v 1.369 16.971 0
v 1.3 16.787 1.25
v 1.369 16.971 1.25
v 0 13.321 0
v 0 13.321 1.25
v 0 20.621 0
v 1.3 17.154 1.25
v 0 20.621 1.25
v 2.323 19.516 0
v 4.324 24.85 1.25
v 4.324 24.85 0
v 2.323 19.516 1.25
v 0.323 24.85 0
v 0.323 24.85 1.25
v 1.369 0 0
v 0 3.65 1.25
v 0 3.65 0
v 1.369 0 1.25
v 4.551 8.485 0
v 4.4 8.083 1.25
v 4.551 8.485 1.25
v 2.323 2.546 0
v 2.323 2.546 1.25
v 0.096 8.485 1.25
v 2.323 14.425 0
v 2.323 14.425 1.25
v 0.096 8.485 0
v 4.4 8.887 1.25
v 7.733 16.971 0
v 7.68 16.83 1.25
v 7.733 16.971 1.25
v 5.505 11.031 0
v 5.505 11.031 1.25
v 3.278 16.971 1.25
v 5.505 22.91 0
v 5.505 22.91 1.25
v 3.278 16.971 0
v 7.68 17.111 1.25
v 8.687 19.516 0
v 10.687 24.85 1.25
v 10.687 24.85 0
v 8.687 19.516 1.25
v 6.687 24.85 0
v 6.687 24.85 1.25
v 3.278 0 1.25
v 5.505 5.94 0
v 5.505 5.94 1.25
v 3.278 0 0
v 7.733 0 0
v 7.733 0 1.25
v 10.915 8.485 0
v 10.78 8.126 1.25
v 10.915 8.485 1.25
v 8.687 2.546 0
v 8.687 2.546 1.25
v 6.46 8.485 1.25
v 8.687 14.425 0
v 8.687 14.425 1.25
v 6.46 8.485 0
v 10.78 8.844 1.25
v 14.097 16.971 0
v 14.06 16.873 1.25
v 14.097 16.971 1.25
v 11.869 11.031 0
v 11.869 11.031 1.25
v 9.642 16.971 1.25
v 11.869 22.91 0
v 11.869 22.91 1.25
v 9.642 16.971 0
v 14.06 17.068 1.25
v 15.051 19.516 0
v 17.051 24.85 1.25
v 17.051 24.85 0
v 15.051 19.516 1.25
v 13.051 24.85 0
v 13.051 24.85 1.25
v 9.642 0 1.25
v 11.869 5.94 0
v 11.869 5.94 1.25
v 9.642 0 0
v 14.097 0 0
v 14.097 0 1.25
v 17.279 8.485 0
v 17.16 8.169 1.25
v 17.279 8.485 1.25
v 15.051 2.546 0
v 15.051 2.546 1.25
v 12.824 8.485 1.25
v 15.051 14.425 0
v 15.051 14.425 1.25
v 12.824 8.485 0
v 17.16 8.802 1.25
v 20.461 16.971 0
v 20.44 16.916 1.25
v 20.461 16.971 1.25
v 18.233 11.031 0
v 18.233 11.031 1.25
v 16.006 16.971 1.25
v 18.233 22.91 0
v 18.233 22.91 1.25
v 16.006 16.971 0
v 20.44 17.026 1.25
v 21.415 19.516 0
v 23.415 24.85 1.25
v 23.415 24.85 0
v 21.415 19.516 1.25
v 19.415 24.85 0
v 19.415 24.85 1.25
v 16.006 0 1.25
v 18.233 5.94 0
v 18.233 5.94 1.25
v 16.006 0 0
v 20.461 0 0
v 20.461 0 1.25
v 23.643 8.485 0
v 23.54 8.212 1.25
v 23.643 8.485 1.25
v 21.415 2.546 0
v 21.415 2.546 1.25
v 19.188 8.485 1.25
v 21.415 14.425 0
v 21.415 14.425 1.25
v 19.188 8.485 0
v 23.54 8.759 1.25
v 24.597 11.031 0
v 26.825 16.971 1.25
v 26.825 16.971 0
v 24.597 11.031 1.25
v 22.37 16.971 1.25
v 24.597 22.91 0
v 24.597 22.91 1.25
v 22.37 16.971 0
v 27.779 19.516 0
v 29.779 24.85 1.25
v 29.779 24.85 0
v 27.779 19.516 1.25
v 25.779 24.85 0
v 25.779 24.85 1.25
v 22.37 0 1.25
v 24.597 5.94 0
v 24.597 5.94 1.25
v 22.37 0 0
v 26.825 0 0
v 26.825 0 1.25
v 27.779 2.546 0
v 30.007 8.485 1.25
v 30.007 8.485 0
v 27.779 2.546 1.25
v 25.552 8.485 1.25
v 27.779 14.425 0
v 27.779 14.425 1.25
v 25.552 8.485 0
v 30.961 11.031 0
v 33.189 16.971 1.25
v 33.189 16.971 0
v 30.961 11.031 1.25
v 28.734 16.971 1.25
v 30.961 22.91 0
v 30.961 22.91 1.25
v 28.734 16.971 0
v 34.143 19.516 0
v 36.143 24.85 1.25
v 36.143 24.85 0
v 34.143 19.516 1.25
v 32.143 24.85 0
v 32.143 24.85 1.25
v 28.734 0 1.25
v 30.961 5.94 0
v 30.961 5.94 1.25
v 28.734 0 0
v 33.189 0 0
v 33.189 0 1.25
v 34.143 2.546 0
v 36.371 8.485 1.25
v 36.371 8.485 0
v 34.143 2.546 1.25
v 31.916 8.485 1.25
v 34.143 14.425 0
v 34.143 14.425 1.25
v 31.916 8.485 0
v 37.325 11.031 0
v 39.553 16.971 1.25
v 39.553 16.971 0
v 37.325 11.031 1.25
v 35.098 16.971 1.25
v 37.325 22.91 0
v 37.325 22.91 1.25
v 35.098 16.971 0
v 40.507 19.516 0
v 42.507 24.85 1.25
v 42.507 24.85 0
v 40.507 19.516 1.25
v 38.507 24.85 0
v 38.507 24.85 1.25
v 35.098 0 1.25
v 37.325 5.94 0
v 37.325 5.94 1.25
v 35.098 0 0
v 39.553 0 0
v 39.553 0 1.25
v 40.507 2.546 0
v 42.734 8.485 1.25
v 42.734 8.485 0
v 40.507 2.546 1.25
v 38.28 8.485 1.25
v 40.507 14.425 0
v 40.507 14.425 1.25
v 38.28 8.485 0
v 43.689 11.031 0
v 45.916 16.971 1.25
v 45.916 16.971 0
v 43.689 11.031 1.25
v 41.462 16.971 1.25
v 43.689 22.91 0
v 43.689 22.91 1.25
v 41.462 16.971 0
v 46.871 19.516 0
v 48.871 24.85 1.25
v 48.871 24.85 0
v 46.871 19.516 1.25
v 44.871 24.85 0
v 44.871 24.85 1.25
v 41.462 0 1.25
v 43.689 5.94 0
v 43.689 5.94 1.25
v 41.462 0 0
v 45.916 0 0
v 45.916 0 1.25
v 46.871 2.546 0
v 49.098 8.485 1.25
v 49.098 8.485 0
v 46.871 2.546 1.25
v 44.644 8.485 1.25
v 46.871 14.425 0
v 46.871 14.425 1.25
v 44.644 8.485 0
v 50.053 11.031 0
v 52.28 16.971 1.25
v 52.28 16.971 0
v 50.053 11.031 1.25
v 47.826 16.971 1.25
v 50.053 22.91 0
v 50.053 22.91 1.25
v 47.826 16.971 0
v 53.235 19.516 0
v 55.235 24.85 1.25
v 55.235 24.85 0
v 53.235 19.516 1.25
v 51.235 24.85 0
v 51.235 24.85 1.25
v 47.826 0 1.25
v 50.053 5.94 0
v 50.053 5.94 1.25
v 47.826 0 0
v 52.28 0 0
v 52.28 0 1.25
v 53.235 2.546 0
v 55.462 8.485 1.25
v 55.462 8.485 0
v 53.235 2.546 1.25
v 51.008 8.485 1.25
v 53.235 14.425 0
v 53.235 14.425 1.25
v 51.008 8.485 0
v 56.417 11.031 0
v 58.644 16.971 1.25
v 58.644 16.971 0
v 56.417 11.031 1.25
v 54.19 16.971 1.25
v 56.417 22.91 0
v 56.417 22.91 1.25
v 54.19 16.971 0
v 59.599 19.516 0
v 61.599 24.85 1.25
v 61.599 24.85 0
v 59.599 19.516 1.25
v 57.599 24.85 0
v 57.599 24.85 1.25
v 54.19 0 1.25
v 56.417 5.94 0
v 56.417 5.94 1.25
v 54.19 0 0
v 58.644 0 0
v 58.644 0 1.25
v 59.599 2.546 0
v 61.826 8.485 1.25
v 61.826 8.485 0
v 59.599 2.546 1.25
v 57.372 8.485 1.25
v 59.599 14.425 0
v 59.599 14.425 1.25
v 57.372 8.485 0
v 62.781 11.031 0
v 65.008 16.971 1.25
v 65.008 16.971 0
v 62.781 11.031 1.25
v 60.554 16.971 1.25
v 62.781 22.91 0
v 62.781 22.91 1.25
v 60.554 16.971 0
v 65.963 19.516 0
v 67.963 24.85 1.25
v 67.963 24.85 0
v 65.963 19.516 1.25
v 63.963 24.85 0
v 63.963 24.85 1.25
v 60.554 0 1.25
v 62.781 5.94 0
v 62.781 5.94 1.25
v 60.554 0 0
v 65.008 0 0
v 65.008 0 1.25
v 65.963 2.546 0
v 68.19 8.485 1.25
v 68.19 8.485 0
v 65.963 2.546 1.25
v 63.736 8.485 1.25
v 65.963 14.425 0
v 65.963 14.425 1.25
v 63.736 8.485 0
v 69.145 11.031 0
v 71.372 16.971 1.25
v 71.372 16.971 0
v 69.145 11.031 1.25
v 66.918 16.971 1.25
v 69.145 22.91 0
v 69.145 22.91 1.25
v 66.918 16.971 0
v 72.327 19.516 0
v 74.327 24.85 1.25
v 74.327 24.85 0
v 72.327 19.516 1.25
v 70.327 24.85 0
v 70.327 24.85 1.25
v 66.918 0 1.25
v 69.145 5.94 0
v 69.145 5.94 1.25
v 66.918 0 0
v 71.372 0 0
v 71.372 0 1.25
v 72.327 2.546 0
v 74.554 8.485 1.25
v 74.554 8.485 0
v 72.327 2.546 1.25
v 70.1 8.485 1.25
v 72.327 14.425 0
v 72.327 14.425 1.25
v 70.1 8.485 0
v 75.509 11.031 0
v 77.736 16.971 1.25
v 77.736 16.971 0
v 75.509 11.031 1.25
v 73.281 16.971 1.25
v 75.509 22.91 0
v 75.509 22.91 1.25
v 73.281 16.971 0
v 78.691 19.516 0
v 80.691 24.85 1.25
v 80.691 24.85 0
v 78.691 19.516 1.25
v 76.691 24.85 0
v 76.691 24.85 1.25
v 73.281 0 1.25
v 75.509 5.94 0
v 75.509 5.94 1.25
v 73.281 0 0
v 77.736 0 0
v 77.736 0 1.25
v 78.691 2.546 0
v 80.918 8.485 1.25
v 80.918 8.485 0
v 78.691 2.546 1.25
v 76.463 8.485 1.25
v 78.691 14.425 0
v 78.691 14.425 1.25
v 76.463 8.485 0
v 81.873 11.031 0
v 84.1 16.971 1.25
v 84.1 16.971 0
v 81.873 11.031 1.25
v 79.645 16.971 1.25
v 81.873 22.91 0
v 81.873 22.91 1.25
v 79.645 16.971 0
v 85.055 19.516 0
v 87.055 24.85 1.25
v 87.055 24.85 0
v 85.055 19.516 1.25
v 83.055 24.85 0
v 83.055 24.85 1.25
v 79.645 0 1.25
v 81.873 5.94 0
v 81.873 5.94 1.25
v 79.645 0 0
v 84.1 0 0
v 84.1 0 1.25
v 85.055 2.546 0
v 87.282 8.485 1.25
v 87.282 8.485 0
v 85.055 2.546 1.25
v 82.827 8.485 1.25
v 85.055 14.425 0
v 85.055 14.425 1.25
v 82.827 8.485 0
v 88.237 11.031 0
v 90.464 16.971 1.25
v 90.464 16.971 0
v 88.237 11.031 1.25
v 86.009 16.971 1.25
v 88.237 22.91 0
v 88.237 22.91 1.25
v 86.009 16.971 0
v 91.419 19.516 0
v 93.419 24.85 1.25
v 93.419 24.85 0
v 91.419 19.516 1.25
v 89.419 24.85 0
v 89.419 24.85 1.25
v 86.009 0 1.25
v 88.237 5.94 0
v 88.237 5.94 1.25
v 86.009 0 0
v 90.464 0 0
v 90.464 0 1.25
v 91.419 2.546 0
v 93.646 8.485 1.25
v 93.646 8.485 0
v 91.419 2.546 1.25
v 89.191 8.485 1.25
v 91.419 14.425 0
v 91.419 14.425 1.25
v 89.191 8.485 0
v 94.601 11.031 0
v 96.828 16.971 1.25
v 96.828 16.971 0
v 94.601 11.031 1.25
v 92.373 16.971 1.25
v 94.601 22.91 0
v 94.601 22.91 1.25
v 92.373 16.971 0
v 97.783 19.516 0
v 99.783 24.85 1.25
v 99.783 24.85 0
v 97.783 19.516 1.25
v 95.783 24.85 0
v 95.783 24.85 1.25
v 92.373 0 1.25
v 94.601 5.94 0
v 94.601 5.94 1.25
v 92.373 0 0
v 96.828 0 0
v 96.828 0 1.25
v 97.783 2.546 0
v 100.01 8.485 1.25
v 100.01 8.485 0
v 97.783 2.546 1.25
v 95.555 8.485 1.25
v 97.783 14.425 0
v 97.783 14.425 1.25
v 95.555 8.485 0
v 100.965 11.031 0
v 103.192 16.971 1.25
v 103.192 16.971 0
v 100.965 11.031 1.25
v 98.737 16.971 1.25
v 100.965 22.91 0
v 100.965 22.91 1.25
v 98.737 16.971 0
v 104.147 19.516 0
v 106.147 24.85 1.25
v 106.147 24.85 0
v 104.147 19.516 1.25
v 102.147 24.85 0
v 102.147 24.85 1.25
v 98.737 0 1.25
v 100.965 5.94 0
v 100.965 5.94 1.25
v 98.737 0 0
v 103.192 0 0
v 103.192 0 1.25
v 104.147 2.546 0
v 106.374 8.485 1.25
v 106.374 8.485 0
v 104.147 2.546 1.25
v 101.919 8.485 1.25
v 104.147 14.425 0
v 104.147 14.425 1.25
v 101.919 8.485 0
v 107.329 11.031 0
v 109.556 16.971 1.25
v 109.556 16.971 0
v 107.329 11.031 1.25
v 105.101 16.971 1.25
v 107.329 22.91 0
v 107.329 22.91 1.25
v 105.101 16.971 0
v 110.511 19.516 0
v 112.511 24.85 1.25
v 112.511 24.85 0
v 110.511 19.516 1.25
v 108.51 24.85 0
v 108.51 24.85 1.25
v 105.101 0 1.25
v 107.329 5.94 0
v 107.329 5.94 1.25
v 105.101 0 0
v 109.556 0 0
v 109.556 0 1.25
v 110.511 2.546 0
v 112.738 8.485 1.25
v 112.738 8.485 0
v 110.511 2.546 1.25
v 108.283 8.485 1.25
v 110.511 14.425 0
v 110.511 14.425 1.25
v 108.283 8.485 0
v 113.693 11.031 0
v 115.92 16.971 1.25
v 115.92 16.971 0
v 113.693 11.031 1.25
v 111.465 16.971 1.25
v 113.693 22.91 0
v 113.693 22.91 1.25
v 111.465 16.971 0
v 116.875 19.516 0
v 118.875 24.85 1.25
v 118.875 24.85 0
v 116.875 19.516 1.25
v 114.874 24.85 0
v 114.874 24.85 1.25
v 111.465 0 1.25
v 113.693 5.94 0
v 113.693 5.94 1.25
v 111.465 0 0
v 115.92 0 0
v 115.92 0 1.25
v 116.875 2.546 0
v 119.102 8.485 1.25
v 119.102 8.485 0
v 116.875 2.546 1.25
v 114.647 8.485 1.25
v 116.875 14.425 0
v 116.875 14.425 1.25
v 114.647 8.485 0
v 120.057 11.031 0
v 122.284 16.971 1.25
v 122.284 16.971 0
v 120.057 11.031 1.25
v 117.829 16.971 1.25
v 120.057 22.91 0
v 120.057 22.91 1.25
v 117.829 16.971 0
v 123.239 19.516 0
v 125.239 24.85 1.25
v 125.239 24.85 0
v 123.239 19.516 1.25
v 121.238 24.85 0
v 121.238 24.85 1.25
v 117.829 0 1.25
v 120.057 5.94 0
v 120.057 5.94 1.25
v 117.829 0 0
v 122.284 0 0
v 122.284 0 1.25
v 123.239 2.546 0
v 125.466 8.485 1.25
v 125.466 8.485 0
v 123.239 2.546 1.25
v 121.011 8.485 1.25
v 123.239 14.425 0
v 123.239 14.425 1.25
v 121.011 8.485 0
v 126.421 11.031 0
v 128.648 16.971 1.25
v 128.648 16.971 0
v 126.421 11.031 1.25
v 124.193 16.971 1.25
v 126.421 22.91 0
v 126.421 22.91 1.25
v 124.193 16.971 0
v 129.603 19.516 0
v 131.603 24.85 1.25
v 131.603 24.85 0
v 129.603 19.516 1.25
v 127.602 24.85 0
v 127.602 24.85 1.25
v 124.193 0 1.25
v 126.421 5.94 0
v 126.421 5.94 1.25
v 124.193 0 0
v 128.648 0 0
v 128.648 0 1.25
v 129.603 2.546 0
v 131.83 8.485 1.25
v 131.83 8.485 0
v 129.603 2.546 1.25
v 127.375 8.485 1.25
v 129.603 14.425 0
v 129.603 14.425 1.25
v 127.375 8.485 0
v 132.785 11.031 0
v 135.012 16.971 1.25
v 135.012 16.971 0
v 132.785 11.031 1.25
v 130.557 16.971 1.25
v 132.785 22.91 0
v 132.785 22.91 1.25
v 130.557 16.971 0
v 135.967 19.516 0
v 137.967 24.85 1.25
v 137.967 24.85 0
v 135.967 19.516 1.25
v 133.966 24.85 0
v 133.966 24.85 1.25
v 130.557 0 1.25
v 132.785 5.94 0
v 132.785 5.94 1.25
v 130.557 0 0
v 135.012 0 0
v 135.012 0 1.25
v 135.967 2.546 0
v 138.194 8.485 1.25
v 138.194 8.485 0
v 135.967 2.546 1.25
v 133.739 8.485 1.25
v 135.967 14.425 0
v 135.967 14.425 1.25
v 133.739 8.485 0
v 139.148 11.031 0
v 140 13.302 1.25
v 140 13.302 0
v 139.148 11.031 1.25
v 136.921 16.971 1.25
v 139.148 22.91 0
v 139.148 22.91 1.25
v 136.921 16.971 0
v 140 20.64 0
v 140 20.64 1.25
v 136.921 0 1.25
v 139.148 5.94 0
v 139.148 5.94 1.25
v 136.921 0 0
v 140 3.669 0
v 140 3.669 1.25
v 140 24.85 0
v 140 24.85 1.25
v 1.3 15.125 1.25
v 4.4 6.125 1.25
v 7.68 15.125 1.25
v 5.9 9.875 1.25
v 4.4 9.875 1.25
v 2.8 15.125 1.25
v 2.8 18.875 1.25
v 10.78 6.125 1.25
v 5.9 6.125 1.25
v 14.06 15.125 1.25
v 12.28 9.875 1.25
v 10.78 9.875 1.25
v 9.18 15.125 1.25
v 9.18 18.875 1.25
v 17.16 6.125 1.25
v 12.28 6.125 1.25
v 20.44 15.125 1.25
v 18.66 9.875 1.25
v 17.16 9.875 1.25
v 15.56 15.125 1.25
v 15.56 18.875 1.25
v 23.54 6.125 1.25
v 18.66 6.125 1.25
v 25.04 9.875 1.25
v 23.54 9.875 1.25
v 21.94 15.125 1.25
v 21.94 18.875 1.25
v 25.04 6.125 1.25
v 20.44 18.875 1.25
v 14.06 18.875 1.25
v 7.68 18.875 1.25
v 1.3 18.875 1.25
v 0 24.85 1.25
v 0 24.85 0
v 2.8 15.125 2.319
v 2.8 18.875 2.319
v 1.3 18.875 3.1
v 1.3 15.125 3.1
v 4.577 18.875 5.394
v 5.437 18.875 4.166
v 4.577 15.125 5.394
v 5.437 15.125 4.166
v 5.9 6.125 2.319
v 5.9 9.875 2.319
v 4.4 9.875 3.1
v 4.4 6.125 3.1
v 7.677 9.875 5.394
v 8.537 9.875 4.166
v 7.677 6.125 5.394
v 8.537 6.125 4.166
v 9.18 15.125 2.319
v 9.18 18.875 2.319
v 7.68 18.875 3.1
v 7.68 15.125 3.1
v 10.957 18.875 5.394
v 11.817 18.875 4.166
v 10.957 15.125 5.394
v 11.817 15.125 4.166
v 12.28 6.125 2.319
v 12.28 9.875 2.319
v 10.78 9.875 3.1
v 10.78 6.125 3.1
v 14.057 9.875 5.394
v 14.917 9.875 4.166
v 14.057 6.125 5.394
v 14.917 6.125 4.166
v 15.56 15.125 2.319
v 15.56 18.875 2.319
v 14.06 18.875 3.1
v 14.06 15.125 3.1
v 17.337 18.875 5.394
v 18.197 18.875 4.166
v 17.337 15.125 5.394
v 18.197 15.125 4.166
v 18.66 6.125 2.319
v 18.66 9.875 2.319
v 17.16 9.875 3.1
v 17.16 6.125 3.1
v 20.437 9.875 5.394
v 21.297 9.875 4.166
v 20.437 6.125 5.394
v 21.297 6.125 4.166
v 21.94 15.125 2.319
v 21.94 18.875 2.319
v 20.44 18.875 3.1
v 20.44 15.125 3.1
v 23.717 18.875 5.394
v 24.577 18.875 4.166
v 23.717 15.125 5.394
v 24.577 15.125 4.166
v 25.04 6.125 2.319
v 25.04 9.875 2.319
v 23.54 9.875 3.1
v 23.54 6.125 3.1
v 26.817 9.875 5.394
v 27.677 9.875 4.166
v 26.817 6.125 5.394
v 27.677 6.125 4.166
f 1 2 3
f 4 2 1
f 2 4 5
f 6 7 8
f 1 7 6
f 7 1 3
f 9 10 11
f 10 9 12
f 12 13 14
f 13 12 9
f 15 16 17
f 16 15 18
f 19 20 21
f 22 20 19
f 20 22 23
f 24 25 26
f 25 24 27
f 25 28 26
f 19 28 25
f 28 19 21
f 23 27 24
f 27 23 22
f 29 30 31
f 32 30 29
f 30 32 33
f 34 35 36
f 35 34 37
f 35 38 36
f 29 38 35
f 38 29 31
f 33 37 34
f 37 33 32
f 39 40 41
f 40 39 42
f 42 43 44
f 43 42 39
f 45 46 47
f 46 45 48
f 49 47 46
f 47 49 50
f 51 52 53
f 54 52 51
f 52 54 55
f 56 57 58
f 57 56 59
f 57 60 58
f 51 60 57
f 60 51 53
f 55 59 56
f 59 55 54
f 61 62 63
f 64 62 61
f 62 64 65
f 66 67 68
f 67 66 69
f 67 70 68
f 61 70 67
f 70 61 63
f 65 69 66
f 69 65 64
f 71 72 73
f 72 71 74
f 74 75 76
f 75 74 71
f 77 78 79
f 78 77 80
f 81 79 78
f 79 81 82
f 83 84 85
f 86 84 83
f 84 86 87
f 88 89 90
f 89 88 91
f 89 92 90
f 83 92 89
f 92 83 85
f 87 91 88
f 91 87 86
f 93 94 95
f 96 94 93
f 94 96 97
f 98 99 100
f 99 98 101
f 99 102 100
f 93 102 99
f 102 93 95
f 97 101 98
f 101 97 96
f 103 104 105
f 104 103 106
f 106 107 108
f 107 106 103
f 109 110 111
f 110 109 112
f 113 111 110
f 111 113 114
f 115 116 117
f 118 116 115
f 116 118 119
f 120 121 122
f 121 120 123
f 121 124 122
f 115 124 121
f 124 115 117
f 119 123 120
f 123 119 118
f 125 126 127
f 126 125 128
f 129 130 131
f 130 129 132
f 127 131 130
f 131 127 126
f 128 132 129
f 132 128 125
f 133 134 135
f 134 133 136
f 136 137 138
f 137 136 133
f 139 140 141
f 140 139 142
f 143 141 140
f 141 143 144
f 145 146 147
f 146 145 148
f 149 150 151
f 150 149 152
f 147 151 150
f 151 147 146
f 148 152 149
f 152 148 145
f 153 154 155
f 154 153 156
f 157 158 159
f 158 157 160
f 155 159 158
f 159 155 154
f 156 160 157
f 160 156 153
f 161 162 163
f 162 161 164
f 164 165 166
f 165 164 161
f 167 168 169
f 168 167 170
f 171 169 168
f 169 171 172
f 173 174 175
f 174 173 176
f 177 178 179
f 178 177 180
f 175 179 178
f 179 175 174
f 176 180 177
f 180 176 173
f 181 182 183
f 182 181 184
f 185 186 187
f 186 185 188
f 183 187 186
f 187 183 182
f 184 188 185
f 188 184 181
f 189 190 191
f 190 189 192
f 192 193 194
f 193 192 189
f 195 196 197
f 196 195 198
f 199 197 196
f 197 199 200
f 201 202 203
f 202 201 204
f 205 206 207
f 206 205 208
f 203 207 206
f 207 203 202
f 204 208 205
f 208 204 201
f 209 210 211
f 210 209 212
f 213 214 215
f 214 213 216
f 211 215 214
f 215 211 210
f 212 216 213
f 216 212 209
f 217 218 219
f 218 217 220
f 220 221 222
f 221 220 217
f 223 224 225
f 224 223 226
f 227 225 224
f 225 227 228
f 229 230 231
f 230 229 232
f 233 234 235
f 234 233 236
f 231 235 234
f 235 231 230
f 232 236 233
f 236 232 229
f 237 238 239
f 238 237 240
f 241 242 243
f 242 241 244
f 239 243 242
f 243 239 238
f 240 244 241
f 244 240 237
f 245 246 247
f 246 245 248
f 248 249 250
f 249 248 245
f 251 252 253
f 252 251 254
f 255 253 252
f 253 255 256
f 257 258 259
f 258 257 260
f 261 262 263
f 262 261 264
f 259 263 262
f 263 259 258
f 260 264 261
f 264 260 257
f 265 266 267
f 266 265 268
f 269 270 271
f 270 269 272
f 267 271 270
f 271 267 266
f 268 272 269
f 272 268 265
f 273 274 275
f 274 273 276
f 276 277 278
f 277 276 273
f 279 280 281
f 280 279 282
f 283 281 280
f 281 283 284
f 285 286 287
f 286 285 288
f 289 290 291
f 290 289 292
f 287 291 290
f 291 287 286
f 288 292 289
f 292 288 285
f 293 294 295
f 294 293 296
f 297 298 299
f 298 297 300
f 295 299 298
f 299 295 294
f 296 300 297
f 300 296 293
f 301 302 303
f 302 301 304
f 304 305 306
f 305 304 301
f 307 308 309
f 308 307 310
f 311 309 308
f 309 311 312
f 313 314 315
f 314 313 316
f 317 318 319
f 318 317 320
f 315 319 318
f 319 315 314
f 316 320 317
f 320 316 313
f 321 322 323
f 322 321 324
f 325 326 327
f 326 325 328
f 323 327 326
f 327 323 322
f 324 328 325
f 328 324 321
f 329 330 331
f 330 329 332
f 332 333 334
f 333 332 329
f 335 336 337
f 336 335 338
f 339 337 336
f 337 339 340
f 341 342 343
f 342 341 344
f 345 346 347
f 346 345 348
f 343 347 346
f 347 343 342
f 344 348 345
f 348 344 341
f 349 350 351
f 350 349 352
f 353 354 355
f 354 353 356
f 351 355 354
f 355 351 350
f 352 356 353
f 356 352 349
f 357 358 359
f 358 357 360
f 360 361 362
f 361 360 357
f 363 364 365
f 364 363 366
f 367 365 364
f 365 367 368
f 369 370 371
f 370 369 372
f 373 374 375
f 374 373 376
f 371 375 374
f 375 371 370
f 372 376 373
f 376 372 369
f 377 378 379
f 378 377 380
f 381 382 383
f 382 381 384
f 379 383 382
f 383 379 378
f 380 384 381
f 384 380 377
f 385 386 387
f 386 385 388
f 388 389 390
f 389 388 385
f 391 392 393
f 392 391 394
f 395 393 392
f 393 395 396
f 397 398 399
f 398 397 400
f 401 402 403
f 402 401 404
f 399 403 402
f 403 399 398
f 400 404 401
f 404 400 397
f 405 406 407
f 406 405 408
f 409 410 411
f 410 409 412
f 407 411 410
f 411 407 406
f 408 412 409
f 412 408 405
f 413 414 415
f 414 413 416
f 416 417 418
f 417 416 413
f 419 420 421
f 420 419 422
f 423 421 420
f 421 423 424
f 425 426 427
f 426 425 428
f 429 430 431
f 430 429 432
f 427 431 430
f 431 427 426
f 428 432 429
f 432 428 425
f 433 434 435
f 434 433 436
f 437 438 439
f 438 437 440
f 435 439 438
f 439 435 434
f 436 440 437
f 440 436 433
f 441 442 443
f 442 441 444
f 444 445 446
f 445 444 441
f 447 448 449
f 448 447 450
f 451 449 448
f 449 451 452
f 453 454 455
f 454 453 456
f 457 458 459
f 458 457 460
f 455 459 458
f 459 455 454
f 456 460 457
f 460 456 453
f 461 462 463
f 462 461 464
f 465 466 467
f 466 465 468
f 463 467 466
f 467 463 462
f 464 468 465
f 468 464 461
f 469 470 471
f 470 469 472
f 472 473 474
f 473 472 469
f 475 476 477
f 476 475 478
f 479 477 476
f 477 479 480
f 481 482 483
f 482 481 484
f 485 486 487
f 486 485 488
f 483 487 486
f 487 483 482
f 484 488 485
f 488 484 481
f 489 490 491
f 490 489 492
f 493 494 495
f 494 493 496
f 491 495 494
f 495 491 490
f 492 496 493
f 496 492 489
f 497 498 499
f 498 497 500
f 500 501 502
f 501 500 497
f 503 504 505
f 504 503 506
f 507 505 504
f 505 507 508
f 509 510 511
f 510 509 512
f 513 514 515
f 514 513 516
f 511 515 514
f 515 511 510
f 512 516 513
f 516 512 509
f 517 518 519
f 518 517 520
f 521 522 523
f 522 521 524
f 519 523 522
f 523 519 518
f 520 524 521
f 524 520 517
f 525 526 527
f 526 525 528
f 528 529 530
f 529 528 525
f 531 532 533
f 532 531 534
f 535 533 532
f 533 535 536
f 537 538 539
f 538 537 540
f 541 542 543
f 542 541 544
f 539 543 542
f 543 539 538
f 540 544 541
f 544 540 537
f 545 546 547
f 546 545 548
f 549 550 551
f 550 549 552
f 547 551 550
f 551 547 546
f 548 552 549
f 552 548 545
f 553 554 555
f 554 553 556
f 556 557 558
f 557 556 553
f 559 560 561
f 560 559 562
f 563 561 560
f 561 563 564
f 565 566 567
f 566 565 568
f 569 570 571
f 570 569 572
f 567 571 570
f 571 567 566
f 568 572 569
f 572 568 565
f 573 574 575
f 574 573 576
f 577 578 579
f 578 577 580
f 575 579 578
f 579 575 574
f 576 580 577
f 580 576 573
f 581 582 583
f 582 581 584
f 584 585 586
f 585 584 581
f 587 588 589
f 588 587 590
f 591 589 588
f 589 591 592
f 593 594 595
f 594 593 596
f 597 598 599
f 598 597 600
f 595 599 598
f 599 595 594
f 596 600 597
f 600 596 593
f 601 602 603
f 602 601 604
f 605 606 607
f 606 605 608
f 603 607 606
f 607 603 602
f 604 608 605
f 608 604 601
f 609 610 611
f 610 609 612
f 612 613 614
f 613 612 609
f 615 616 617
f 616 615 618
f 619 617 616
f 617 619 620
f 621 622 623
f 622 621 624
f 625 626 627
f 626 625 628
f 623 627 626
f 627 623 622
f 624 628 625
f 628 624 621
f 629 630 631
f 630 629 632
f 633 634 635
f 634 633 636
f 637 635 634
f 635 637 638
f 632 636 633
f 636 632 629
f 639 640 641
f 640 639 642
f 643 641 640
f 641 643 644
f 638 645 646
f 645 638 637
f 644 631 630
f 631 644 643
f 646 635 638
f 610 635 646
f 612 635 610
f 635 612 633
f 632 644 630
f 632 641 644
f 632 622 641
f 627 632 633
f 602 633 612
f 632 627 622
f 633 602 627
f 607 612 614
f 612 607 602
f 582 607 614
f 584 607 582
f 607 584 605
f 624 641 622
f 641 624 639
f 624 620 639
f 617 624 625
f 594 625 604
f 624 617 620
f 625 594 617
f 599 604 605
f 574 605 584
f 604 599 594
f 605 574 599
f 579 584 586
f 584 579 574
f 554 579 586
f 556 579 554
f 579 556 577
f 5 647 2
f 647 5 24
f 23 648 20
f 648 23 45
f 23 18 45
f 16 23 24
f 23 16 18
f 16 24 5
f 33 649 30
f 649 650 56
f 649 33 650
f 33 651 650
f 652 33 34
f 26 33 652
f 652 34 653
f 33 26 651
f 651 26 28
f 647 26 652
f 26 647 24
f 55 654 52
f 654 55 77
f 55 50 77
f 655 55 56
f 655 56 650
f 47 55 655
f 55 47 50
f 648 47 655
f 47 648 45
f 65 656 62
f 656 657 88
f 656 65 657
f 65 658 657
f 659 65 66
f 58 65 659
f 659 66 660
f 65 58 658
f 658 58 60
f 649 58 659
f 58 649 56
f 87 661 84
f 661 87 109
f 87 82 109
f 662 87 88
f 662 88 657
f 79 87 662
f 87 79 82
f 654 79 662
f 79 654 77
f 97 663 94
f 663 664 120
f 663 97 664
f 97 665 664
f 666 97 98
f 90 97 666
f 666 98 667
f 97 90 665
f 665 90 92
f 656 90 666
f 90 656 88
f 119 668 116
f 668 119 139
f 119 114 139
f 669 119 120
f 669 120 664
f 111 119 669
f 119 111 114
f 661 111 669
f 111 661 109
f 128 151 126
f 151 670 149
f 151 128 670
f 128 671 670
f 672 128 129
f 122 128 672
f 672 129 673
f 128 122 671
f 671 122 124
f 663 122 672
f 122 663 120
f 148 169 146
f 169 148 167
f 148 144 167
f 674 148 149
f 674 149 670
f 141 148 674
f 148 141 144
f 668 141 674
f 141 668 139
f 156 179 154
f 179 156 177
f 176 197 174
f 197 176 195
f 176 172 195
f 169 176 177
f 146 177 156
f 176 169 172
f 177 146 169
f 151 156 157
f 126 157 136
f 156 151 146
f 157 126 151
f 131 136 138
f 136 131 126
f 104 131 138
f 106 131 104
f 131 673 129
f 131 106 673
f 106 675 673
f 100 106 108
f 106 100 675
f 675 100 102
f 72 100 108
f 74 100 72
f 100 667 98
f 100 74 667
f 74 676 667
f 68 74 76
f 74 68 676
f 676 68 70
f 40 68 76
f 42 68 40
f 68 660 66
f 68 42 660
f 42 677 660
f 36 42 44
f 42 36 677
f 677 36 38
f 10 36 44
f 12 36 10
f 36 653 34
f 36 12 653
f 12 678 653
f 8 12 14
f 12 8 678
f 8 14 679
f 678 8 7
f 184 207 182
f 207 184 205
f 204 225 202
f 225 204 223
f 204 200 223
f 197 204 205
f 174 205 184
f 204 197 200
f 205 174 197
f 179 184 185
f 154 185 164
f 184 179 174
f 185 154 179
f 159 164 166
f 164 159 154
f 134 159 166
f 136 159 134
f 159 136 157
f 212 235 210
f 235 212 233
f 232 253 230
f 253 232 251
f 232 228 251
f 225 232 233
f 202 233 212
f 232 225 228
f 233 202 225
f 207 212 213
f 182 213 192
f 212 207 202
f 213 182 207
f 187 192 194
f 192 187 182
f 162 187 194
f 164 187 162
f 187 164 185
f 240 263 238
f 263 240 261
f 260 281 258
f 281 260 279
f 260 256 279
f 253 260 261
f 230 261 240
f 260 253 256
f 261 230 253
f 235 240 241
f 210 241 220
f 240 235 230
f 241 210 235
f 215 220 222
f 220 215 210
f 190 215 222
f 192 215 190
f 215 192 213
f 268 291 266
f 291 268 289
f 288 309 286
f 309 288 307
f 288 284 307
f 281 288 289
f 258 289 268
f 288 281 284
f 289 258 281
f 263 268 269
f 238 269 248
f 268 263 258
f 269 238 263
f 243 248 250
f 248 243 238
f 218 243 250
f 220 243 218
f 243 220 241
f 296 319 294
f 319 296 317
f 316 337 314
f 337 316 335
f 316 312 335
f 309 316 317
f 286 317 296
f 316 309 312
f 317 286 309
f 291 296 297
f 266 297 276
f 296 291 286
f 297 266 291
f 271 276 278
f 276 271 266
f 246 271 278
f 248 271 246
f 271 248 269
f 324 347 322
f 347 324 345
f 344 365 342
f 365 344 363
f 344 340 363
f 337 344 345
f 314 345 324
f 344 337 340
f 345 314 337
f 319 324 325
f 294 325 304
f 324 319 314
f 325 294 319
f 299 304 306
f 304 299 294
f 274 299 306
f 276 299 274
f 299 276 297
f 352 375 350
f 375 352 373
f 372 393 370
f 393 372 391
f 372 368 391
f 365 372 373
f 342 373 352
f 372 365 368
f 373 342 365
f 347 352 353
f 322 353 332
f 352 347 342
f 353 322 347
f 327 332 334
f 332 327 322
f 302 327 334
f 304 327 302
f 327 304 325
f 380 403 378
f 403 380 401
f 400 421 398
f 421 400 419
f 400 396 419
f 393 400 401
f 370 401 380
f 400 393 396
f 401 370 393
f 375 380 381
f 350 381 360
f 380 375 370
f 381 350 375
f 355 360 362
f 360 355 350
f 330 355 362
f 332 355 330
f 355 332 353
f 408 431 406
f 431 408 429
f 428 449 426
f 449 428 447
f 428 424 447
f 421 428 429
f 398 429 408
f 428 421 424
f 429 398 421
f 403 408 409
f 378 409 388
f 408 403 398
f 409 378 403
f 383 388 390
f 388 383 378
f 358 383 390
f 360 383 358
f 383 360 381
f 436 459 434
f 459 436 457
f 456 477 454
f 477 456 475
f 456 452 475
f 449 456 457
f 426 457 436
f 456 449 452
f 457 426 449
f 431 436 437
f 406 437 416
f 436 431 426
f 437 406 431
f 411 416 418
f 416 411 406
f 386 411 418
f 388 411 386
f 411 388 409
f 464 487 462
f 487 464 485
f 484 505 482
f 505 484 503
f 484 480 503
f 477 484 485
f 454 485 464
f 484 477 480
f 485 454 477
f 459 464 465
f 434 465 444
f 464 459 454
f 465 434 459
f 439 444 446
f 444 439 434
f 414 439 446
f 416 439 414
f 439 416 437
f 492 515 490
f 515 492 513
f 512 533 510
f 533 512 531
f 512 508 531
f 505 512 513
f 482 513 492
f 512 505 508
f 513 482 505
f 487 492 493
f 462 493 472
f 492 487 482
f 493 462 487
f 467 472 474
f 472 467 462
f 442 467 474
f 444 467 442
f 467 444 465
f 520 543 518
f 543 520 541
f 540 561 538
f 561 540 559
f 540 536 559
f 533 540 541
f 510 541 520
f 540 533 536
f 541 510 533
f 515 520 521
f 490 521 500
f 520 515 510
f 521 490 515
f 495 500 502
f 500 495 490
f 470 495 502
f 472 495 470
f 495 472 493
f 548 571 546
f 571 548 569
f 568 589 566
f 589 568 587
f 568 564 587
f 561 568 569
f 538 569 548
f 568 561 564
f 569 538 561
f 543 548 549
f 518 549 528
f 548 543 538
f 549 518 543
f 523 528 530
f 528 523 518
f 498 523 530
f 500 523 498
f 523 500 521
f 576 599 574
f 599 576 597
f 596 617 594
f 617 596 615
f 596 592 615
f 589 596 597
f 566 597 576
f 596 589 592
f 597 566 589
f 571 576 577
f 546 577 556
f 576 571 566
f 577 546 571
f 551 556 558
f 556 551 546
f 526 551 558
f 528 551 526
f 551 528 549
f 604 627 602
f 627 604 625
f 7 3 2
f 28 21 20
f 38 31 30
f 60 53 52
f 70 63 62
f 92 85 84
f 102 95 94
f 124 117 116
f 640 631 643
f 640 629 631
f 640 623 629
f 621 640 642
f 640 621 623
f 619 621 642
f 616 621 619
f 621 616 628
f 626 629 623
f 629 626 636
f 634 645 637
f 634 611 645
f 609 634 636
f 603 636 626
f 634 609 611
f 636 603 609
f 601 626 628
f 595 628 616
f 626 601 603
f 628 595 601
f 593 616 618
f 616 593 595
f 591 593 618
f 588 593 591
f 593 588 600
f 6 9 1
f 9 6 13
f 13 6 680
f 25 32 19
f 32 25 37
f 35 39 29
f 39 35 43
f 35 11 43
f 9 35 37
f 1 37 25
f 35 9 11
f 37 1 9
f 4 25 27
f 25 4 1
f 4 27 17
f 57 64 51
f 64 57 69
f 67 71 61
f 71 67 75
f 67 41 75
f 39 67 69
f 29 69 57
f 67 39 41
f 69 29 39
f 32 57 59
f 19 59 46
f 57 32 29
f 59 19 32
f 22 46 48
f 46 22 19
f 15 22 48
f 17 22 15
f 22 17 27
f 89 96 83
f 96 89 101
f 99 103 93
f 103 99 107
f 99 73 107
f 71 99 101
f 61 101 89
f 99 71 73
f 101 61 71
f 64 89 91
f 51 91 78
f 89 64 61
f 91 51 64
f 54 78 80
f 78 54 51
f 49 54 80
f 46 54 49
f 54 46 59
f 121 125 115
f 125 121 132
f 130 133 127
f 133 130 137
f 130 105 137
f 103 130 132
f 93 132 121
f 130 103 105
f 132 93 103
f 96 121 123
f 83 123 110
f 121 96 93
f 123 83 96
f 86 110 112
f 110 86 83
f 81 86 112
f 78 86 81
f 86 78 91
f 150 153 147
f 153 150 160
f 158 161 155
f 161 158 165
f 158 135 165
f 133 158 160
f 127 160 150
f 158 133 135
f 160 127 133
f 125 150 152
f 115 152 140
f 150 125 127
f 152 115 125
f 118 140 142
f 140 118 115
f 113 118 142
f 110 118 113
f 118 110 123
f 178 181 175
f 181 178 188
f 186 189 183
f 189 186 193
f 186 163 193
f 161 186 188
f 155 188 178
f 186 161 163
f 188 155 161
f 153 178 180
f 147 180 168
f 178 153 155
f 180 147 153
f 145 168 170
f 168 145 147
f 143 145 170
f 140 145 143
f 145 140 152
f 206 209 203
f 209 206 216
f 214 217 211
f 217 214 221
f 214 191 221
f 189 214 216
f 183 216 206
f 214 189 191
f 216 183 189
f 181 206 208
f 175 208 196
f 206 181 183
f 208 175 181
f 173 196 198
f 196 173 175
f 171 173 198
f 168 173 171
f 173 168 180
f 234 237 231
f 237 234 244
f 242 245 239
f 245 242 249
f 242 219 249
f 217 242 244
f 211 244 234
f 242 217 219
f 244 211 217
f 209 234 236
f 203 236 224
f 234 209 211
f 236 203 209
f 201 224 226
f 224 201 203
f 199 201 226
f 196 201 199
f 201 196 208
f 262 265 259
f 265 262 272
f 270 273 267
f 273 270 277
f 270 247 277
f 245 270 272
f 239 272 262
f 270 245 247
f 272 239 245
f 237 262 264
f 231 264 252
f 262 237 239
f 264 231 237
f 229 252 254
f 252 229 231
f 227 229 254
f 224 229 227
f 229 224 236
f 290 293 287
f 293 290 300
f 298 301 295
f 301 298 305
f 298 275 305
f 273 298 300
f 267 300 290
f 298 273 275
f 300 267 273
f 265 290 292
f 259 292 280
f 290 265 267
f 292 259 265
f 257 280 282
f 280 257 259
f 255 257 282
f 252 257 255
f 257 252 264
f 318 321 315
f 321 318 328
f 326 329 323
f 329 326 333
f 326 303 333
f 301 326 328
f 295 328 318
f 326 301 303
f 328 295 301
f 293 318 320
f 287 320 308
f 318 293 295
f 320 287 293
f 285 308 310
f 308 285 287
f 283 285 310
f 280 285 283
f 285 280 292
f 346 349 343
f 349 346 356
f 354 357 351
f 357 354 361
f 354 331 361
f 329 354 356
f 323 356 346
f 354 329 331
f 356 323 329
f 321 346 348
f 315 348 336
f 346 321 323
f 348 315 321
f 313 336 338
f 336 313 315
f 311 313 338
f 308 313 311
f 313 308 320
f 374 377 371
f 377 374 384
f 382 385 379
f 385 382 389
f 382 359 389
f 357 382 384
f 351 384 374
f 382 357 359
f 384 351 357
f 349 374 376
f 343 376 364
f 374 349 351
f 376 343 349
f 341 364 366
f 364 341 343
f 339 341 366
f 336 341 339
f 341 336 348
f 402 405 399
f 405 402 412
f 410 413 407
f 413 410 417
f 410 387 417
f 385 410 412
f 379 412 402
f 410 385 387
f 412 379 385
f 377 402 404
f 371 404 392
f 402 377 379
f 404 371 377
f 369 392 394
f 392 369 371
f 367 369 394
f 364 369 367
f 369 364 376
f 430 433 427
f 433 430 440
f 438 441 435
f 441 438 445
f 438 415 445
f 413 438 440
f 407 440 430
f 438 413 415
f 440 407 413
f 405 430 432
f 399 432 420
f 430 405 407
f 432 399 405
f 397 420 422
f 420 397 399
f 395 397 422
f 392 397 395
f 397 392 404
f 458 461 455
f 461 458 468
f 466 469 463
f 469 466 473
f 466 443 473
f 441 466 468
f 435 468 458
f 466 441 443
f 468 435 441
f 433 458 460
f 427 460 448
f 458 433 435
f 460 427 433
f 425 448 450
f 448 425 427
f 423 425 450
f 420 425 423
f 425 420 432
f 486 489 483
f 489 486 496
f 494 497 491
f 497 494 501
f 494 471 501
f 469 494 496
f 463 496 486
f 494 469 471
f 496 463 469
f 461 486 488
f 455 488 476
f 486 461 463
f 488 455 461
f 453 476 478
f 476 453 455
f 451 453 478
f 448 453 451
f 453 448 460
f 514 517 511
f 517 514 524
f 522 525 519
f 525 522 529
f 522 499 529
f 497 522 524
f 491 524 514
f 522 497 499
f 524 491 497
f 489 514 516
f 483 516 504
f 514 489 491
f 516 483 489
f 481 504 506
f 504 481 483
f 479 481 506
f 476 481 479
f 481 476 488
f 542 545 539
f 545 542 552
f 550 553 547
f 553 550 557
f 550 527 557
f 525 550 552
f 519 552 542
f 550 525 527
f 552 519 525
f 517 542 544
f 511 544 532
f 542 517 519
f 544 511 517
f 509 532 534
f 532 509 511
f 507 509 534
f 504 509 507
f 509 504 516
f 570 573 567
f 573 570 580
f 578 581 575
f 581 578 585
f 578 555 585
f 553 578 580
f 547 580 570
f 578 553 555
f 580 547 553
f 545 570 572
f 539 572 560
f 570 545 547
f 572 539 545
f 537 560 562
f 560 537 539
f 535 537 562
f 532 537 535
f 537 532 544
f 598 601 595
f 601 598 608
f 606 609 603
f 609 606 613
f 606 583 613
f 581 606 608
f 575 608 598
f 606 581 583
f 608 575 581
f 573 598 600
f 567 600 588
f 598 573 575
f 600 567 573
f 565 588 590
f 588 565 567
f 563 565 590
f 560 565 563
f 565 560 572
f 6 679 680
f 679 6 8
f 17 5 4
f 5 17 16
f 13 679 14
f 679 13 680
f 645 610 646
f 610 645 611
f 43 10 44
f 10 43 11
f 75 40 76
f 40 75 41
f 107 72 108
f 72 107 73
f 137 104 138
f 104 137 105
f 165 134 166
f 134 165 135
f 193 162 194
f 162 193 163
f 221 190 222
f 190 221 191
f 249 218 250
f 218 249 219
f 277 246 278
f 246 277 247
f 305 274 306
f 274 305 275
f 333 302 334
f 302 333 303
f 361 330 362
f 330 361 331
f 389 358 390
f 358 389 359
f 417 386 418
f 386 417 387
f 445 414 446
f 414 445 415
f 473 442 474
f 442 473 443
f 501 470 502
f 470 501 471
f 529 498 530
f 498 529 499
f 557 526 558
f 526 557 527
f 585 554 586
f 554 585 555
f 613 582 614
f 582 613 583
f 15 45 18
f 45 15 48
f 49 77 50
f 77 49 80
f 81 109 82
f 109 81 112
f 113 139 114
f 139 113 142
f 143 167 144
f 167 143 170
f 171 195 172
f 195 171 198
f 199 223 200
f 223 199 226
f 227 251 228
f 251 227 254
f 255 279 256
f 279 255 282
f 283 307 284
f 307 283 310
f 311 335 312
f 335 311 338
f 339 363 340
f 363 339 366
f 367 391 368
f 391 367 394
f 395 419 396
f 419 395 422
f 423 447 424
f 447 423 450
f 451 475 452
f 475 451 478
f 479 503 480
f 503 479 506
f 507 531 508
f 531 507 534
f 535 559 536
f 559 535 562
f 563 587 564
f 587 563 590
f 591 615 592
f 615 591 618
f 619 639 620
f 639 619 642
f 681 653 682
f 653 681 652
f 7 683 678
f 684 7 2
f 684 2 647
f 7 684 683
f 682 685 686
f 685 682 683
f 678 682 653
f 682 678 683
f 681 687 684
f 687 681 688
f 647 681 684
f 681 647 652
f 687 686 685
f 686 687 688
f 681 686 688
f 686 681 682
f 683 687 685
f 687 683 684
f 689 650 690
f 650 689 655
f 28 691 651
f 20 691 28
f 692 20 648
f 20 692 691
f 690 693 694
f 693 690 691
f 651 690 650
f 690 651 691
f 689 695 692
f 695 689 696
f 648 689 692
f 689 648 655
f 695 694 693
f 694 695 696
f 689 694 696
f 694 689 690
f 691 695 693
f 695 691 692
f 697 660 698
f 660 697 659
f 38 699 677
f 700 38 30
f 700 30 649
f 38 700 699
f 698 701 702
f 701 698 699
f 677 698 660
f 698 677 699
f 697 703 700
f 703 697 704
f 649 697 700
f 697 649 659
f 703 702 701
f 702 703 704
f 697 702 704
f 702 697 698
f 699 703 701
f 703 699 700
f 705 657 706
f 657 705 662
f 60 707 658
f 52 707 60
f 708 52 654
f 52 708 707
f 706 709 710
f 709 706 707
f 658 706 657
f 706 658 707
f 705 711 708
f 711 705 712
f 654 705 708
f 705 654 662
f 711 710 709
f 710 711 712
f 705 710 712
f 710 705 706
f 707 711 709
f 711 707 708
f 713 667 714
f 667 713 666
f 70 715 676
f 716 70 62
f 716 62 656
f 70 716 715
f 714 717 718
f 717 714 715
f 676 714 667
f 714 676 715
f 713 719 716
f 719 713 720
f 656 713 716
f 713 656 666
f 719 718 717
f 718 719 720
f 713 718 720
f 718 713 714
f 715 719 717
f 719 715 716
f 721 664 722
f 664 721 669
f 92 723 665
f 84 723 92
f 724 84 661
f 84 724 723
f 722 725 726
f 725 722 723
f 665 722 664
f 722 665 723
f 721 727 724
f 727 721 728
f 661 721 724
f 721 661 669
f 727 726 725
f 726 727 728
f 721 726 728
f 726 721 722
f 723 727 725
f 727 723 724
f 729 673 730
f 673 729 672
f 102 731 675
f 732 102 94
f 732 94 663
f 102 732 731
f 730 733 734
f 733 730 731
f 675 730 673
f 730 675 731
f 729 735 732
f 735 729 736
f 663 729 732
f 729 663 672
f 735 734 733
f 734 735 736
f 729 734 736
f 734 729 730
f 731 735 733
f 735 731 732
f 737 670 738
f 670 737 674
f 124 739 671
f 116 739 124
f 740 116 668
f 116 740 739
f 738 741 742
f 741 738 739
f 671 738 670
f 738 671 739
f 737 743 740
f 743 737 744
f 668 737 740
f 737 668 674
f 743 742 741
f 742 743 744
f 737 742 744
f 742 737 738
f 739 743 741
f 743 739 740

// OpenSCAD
//print 2 shells / 100% infill

/* [Strap Settings] */

//(in mm)
strap_length = 140; 

//(25mm 1st row, 15mm each extra)
width_in_rows = 1; 

//(hooks)
nib_rows = 4;  

//(in mm)
strap_thickness = 1.25; 

/* [Advanced] */

//(nibs every X position)
nib_spacing_multiplier = 1;

nib_angle = 55;
nib_top_length = 4;
nib_thickness = 1.5;
nib_width = 3.75;

//(based on strap thickness)
extra_nib_base_height = .6;

/* [Hidden] */
nib_spacing = 6.38;
length_per_quad = 5.0;
strap_width_per_row = 24.85;


for ( y = [1 : width_in_rows] )
{
	translate([0,(strap_width_per_row / 1.5) * (y - 1),0]) one_row();
}


module one_row()
{
	difference()
	{
		cube([strap_length,strap_width_per_row,strap_thickness]);
		cut_outs();
	}
	nibs();

}

module cut_outs()
{
	scale ([0.9,2.4,1])
	for ( x = [0 : (strap_length / length_per_quad) + 1 ])
	{
		translate([-10.5,0,0])
		rotate( -45, [0, 0, 1])
		for ( y = [0 : (strap_length / length_per_quad) + 1] )
		{
			 if (x - y > -4)
			 if (x - y < 2)	
			{
		    	translate([x * 5, y * 5, strap_thickness * -.1])
			 	cube([3.5,3.5,strap_thickness * 1.2]);}
				}
	}
}

module nibs()
{
	for ( x = [0 : nib_rows - 1])
	{
	translate ([1.3 + x * nib_spacing * nib_spacing_multiplier, 18.5 - (nib_width / 2),0]) nib();
	translate ([4.4 + x * nib_spacing * nib_spacing_multiplier, 9.5 - (nib_width / 2),0]) nib();
	}

}

module nib()
{

	translate ([0,nib_thickness / -1,strap_thickness]) rotate (0,[0,1,0]) cube([nib_thickness,nib_width,strap_thickness + extra_nib_base_height]);
	translate ([0,nib_thickness / -1,strap_thickness + (strap_thickness + extra_nib_base_height)]) rotate (nib_angle,[0,1,0]) cube([nib_thickness,nib_width,nib_top_length]);
}
